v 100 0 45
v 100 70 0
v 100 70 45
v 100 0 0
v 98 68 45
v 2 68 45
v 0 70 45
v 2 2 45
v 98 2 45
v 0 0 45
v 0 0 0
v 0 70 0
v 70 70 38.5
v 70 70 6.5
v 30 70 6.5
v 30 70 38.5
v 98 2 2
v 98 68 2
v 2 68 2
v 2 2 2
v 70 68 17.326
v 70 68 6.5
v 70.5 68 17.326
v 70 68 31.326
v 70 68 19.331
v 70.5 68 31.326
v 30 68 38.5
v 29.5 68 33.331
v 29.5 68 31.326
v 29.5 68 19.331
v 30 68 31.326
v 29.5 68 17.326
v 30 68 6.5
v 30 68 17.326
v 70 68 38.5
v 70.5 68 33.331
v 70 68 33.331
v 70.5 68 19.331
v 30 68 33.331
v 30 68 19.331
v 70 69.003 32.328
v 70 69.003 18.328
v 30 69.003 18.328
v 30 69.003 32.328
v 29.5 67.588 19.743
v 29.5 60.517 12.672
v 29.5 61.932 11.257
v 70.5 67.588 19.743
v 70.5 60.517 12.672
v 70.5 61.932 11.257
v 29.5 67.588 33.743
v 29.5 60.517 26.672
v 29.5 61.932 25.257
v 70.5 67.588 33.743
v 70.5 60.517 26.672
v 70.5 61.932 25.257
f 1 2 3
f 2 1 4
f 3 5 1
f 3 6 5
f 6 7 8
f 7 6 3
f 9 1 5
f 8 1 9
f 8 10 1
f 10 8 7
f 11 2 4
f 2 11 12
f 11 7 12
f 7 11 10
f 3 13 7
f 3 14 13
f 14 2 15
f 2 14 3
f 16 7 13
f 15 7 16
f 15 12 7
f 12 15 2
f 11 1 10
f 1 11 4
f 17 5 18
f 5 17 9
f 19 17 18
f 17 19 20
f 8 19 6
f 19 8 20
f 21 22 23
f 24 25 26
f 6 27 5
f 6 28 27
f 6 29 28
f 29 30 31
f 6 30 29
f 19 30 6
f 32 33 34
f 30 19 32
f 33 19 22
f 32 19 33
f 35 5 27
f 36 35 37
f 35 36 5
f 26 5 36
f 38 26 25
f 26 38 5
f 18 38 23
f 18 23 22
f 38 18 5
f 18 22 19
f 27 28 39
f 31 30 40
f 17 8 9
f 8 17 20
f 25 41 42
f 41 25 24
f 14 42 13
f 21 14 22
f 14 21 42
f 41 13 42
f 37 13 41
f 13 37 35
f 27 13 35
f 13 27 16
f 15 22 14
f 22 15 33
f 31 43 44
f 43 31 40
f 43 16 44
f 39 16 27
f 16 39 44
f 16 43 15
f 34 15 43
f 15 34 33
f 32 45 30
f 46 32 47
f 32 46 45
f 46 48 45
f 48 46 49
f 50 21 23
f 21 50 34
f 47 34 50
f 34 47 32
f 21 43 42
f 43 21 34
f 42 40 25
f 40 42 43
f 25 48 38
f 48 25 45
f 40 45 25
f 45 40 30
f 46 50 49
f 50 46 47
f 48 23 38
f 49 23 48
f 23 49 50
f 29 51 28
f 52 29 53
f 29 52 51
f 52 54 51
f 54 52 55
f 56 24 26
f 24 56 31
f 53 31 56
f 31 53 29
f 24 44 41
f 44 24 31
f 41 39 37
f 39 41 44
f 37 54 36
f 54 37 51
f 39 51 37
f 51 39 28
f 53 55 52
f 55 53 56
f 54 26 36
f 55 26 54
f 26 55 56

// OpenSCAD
$fn = 32;

// ----------------------------------------------------------------------
// Vent box: louvers enclosure
// ----------------------------------------------------------------------

// --- parameters (mm) ---
box_l = 100;              // box length, X
box_w = 70;               // box width, Y
box_h = 45;               // box height, Z
wall_t = 2;               // shell wall thickness
win_l = 40;               // vent window width, X
win_h = 32;               // vent window height, Z
slat_t = 2;               // louver slat thickness
slat_d = 10;              // louver slat depth
slat_a = 45;              // louver slat angle, degrees
slat_pitch = 14;          // louver pitch
slat_yc = 64.76;          // slat centreline Y

win_z0 = (box_h - win_h) / 2;  // window lower edge Z
n_slats = 2;  // louver count
slat_z0 = win_z0 + (win_h - (n_slats - 1) * slat_pitch) / 2;

difference() {
  union() {
    difference() {
      cube([box_l, box_w, box_h]);
  translate([wall_t, wall_t, wall_t])
    cube([box_l - 2 * wall_t, box_w - 2 * wall_t, box_h]);
  translate([(box_l - win_l) / 2, box_w - wall_t - 1, win_z0])
    cube([win_l, wall_t + 2, win_h]);
    }
    for (i = [0 : n_slats - 1])
      translate([box_l / 2, slat_yc, slat_z0 + i * slat_pitch])
        rotate([slat_a, 0, 0])
          cube([win_l + 1, slat_d, slat_t], center = true);
  }
}
